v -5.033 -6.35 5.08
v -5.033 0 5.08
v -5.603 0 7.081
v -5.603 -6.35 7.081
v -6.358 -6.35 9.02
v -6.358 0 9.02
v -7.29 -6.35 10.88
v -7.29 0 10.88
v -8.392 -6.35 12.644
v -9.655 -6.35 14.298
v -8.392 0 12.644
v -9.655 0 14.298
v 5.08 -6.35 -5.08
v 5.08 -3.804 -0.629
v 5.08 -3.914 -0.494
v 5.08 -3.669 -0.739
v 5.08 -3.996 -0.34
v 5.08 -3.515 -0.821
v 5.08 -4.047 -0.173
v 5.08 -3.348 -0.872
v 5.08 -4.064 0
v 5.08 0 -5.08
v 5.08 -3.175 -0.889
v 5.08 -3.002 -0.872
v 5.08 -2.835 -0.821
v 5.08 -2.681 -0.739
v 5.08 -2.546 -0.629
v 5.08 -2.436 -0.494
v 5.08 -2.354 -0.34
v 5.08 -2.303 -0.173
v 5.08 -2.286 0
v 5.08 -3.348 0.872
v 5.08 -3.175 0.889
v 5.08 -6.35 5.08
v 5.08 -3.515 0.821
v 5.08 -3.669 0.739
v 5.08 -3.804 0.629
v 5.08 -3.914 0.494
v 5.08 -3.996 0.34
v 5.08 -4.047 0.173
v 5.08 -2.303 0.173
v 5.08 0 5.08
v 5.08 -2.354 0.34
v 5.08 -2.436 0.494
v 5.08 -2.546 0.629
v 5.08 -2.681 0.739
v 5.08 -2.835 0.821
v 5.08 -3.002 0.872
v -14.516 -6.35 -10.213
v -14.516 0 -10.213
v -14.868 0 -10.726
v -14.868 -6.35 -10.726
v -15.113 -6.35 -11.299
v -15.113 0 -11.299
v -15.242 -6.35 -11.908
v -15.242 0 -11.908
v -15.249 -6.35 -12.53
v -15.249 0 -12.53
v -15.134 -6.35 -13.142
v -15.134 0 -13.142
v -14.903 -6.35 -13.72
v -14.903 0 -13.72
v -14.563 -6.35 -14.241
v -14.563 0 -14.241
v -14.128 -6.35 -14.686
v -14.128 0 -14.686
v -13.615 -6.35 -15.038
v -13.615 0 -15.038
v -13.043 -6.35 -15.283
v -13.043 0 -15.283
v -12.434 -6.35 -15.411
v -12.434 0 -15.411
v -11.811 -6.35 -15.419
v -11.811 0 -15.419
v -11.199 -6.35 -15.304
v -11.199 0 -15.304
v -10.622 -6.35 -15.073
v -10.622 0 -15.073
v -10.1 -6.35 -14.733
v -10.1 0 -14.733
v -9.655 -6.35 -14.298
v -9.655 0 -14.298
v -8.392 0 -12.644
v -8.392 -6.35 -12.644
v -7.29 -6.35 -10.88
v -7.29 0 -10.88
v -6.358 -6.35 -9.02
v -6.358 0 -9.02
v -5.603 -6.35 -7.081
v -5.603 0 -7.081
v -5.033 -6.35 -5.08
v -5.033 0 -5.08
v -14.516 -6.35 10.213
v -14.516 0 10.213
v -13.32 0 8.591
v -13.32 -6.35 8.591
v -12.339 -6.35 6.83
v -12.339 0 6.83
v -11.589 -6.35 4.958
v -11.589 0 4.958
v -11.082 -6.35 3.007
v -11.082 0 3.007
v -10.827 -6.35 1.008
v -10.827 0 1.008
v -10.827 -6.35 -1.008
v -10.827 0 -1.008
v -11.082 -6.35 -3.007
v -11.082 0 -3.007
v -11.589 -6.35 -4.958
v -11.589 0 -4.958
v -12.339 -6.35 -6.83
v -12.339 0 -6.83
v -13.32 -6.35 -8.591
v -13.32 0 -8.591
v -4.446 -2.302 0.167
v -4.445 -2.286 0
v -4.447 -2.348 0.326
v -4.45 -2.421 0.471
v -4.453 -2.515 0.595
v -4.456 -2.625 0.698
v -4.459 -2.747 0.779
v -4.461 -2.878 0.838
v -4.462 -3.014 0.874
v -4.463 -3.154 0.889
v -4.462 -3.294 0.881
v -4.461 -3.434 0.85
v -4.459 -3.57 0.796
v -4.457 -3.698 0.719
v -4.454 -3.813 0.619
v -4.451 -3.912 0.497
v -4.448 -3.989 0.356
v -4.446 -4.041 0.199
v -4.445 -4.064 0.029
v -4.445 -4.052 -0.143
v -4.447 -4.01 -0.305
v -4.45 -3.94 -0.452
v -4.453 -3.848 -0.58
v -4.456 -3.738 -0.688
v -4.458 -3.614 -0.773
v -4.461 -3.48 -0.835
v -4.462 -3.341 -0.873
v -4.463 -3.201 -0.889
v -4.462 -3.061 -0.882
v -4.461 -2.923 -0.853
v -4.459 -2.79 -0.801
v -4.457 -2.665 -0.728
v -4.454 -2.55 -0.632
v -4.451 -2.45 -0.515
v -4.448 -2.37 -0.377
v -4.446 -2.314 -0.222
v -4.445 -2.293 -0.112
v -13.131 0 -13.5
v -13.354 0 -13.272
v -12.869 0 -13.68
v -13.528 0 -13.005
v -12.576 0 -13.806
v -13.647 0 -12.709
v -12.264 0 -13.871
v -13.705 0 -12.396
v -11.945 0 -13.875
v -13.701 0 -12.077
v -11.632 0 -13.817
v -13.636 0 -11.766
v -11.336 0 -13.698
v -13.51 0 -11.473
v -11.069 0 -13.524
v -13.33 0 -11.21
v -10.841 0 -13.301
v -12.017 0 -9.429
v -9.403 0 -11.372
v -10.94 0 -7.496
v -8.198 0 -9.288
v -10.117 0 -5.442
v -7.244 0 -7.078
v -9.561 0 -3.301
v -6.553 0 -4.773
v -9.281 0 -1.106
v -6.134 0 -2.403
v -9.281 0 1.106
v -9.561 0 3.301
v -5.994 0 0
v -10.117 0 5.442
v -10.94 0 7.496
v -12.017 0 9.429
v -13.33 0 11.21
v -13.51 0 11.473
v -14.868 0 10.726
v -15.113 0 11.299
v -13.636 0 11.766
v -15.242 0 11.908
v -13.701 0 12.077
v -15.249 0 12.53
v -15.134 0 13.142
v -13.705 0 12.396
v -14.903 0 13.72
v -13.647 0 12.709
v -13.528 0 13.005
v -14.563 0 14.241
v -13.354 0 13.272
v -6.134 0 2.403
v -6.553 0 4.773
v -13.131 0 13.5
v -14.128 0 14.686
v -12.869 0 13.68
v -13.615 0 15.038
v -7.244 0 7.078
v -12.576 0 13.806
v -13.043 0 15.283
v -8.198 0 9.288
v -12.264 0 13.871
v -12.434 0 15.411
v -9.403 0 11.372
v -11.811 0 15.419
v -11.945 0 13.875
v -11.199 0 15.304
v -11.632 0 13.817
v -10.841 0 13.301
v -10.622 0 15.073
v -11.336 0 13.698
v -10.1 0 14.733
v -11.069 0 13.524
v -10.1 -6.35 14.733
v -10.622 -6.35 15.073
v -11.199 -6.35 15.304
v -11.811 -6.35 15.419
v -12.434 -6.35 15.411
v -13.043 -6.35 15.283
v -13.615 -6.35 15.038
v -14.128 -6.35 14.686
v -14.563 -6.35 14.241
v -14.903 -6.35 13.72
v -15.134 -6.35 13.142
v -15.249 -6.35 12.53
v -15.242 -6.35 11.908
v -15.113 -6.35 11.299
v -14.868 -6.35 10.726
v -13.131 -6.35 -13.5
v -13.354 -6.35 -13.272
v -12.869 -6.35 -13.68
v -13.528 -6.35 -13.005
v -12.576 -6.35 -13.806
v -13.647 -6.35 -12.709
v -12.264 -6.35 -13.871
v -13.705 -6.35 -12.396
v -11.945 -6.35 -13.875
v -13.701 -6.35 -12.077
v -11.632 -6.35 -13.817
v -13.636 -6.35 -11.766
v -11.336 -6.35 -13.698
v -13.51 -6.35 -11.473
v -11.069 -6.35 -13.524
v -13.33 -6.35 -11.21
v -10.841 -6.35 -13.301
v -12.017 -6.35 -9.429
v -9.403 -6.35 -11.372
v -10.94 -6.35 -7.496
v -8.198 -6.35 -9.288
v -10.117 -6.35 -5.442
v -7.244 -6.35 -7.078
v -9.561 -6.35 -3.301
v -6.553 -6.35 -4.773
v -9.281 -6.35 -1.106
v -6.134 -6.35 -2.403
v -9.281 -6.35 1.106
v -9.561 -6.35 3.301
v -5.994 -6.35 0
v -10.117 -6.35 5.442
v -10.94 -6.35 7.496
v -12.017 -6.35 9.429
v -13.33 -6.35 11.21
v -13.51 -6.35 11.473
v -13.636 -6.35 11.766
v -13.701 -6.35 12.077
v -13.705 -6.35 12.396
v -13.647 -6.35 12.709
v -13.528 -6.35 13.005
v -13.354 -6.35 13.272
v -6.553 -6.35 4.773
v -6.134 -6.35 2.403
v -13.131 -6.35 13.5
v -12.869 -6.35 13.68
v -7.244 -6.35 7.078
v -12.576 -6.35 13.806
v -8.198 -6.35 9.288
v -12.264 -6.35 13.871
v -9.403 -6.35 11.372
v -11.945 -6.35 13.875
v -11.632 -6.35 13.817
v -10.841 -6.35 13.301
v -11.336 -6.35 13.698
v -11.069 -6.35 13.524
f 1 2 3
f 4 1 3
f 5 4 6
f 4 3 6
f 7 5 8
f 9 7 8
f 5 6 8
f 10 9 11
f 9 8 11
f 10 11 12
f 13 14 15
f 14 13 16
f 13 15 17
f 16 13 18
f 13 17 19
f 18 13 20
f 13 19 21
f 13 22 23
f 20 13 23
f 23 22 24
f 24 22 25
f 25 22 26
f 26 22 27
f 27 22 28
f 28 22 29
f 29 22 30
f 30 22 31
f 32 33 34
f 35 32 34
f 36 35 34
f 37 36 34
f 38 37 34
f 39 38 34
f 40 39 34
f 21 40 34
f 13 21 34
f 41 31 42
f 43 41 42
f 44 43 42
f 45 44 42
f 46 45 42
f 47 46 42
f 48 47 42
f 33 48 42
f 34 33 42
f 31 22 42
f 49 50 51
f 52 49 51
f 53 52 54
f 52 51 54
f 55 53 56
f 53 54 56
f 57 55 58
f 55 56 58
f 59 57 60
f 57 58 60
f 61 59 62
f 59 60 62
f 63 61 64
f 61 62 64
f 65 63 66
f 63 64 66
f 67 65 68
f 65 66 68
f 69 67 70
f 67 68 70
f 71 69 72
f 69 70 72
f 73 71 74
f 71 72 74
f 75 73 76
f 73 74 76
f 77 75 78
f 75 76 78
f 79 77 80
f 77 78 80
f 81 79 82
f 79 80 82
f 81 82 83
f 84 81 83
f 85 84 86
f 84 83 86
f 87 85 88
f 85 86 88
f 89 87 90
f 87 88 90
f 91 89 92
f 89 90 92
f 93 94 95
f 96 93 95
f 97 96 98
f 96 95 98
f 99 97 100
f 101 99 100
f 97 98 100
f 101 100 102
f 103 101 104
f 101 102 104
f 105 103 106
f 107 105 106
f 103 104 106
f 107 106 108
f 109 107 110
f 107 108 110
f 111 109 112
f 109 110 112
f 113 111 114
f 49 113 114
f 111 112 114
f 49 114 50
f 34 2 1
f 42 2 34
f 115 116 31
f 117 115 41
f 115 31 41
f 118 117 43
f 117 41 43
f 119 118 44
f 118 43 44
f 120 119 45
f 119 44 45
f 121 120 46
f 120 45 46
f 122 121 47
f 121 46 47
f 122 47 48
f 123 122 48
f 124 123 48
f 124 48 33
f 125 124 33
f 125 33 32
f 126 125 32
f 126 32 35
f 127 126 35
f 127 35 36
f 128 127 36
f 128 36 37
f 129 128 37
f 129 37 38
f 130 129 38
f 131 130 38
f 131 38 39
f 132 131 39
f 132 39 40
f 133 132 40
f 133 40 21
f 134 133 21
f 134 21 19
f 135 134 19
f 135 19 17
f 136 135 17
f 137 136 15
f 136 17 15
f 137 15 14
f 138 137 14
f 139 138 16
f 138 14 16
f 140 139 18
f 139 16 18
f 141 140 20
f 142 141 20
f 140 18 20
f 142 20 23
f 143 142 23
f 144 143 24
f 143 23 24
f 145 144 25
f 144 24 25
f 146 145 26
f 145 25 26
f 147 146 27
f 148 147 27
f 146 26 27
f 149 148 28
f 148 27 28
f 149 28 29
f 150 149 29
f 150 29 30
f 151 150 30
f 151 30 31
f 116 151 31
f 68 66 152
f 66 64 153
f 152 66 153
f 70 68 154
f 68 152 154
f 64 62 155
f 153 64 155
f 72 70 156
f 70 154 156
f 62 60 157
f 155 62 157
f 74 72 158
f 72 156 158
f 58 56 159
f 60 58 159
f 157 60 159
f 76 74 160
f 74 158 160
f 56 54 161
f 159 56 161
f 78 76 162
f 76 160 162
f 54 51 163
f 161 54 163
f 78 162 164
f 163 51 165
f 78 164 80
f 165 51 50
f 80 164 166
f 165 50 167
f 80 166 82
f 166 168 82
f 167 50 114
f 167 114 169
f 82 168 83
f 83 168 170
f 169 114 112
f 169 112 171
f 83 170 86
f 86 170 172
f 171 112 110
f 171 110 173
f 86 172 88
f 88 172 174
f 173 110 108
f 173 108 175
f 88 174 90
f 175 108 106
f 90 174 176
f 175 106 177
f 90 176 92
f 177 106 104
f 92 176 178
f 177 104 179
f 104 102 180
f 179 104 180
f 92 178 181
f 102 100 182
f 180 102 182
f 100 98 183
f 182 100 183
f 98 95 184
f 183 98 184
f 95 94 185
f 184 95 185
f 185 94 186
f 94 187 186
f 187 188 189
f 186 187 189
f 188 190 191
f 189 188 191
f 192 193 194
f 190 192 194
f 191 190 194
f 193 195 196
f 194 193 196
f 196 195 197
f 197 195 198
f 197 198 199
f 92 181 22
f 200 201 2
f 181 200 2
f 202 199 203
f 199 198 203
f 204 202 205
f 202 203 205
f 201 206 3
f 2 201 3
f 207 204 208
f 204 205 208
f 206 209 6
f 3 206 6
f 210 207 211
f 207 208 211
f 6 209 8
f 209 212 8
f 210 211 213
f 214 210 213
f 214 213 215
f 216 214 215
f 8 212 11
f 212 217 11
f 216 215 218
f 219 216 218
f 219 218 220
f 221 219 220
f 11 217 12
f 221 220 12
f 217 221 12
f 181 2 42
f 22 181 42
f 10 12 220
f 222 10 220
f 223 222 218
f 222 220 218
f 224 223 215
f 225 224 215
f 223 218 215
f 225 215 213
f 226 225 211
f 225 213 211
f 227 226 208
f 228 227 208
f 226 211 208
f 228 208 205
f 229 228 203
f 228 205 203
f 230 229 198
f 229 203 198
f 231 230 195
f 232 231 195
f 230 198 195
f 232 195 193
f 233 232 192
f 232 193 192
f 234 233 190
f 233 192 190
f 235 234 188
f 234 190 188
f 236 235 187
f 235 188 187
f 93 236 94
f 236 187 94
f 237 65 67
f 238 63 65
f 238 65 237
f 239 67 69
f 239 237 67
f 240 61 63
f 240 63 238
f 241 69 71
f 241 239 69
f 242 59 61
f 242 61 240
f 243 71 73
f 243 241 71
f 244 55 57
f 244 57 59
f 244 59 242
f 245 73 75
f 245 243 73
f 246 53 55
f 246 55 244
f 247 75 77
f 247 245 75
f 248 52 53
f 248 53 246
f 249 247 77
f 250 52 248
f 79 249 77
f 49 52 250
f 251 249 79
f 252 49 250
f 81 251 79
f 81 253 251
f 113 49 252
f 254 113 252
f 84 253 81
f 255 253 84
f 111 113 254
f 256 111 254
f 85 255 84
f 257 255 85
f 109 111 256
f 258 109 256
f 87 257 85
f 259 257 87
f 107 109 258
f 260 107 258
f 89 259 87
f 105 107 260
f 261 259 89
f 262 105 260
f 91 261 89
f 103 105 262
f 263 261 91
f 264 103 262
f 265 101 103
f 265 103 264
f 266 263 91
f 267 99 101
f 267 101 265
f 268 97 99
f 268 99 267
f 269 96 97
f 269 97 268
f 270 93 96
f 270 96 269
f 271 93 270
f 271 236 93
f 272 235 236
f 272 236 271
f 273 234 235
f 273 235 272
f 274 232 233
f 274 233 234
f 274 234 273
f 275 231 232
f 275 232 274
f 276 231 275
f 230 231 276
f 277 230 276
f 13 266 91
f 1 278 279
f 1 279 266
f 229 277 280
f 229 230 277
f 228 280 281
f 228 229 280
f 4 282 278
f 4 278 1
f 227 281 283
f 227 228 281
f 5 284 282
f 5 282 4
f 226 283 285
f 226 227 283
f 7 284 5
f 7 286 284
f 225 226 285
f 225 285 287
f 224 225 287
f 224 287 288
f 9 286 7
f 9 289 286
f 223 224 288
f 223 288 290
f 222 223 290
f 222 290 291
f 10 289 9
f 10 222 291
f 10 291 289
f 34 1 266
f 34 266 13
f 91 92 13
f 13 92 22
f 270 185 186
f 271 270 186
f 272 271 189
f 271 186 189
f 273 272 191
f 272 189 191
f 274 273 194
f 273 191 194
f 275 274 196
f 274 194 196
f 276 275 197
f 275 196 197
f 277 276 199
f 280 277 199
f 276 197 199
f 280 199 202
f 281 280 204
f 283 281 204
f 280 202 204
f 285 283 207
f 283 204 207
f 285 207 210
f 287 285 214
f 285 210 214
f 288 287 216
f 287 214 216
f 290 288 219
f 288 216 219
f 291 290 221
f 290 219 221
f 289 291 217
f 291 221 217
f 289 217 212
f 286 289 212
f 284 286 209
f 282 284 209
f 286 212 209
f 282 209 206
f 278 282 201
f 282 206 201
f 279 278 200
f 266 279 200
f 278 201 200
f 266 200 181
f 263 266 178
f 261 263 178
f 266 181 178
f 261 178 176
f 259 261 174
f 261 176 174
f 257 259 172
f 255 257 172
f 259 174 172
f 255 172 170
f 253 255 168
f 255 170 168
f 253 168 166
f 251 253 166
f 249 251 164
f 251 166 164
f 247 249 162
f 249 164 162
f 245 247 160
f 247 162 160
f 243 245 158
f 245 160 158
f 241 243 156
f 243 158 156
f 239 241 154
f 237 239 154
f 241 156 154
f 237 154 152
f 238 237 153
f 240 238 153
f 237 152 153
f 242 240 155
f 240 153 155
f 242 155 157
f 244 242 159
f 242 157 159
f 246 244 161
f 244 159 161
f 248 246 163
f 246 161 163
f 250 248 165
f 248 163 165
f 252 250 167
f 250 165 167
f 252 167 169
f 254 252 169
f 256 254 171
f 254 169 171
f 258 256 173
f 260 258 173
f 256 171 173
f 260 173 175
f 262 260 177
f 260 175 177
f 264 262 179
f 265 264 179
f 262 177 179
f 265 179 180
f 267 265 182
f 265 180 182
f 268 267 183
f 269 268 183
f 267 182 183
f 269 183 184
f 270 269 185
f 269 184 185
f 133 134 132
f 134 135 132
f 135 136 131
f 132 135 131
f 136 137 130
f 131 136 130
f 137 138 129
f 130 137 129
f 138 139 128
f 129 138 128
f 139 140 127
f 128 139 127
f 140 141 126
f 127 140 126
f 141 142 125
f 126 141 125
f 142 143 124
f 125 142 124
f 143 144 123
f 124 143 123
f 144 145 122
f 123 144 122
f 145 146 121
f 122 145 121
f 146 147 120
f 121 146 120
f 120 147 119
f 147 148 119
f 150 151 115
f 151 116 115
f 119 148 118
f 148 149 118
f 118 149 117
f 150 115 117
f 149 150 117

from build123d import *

# Parameters (mm, degrees)
F0_W     = 10.16
F0_H     = 10.16
F1_DEPTH = 6.35
F2_R     = 0.889
F3_DEPTH = 25.4
F5_DEPTH = 6.35


with BuildPart() as f1:
    # F0 (on Front) → F1 (new body)
    with BuildSketch(Plane.XZ):
        Rectangle(F0_W, F0_H)
    extrude(amount=F1_DEPTH)

    # F2 (on face) → F3 (cut)
    with BuildSketch(Plane.YZ.offset(5.08)):
        with Locations((-3.175, 0)):
            Circle(F2_R)
    extrude(amount=-F3_DEPTH, mode=Mode.SUBTRACT)

    # F4 (on Front) → F5 (join)
    with BuildSketch(Plane.XZ):
        with BuildLine():
            ThreePointArc((-14.516378, -10.212987), (-14.12825, -14.686308), (-9.654929, -14.298181))
            ThreePointArc((-9.654929, -14.298181), (-4.445, 0), (-9.654929, 14.298181))
            ThreePointArc((-9.654929, 14.298181), (-14.12825, 14.686308), (-14.516378, 10.212987))
            ThreePointArc((-14.516378, 10.212987), (-10.795, 0), (-14.516378, -10.212987))
        make_face()
        with BuildLine():
            ThreePointArc((-10.841122, 13.301393), (-5.9944, 0), (-10.841122, -13.301393))
            ThreePointArc((-10.841122, -13.301393), (-13.131463, -13.500114), (-13.330184, -11.209774))
            ThreePointArc((-13.330184, -11.209774), (-9.2456, 0), (-13.330184, 11.209774))
            ThreePointArc((-13.330184, 11.209774), (-13.131463, 13.500114), (-10.841122, 13.301393))
        make_face(mode=Mode.SUBTRACT)
    extrude(amount=F5_DEPTH)


solid = f1.part
